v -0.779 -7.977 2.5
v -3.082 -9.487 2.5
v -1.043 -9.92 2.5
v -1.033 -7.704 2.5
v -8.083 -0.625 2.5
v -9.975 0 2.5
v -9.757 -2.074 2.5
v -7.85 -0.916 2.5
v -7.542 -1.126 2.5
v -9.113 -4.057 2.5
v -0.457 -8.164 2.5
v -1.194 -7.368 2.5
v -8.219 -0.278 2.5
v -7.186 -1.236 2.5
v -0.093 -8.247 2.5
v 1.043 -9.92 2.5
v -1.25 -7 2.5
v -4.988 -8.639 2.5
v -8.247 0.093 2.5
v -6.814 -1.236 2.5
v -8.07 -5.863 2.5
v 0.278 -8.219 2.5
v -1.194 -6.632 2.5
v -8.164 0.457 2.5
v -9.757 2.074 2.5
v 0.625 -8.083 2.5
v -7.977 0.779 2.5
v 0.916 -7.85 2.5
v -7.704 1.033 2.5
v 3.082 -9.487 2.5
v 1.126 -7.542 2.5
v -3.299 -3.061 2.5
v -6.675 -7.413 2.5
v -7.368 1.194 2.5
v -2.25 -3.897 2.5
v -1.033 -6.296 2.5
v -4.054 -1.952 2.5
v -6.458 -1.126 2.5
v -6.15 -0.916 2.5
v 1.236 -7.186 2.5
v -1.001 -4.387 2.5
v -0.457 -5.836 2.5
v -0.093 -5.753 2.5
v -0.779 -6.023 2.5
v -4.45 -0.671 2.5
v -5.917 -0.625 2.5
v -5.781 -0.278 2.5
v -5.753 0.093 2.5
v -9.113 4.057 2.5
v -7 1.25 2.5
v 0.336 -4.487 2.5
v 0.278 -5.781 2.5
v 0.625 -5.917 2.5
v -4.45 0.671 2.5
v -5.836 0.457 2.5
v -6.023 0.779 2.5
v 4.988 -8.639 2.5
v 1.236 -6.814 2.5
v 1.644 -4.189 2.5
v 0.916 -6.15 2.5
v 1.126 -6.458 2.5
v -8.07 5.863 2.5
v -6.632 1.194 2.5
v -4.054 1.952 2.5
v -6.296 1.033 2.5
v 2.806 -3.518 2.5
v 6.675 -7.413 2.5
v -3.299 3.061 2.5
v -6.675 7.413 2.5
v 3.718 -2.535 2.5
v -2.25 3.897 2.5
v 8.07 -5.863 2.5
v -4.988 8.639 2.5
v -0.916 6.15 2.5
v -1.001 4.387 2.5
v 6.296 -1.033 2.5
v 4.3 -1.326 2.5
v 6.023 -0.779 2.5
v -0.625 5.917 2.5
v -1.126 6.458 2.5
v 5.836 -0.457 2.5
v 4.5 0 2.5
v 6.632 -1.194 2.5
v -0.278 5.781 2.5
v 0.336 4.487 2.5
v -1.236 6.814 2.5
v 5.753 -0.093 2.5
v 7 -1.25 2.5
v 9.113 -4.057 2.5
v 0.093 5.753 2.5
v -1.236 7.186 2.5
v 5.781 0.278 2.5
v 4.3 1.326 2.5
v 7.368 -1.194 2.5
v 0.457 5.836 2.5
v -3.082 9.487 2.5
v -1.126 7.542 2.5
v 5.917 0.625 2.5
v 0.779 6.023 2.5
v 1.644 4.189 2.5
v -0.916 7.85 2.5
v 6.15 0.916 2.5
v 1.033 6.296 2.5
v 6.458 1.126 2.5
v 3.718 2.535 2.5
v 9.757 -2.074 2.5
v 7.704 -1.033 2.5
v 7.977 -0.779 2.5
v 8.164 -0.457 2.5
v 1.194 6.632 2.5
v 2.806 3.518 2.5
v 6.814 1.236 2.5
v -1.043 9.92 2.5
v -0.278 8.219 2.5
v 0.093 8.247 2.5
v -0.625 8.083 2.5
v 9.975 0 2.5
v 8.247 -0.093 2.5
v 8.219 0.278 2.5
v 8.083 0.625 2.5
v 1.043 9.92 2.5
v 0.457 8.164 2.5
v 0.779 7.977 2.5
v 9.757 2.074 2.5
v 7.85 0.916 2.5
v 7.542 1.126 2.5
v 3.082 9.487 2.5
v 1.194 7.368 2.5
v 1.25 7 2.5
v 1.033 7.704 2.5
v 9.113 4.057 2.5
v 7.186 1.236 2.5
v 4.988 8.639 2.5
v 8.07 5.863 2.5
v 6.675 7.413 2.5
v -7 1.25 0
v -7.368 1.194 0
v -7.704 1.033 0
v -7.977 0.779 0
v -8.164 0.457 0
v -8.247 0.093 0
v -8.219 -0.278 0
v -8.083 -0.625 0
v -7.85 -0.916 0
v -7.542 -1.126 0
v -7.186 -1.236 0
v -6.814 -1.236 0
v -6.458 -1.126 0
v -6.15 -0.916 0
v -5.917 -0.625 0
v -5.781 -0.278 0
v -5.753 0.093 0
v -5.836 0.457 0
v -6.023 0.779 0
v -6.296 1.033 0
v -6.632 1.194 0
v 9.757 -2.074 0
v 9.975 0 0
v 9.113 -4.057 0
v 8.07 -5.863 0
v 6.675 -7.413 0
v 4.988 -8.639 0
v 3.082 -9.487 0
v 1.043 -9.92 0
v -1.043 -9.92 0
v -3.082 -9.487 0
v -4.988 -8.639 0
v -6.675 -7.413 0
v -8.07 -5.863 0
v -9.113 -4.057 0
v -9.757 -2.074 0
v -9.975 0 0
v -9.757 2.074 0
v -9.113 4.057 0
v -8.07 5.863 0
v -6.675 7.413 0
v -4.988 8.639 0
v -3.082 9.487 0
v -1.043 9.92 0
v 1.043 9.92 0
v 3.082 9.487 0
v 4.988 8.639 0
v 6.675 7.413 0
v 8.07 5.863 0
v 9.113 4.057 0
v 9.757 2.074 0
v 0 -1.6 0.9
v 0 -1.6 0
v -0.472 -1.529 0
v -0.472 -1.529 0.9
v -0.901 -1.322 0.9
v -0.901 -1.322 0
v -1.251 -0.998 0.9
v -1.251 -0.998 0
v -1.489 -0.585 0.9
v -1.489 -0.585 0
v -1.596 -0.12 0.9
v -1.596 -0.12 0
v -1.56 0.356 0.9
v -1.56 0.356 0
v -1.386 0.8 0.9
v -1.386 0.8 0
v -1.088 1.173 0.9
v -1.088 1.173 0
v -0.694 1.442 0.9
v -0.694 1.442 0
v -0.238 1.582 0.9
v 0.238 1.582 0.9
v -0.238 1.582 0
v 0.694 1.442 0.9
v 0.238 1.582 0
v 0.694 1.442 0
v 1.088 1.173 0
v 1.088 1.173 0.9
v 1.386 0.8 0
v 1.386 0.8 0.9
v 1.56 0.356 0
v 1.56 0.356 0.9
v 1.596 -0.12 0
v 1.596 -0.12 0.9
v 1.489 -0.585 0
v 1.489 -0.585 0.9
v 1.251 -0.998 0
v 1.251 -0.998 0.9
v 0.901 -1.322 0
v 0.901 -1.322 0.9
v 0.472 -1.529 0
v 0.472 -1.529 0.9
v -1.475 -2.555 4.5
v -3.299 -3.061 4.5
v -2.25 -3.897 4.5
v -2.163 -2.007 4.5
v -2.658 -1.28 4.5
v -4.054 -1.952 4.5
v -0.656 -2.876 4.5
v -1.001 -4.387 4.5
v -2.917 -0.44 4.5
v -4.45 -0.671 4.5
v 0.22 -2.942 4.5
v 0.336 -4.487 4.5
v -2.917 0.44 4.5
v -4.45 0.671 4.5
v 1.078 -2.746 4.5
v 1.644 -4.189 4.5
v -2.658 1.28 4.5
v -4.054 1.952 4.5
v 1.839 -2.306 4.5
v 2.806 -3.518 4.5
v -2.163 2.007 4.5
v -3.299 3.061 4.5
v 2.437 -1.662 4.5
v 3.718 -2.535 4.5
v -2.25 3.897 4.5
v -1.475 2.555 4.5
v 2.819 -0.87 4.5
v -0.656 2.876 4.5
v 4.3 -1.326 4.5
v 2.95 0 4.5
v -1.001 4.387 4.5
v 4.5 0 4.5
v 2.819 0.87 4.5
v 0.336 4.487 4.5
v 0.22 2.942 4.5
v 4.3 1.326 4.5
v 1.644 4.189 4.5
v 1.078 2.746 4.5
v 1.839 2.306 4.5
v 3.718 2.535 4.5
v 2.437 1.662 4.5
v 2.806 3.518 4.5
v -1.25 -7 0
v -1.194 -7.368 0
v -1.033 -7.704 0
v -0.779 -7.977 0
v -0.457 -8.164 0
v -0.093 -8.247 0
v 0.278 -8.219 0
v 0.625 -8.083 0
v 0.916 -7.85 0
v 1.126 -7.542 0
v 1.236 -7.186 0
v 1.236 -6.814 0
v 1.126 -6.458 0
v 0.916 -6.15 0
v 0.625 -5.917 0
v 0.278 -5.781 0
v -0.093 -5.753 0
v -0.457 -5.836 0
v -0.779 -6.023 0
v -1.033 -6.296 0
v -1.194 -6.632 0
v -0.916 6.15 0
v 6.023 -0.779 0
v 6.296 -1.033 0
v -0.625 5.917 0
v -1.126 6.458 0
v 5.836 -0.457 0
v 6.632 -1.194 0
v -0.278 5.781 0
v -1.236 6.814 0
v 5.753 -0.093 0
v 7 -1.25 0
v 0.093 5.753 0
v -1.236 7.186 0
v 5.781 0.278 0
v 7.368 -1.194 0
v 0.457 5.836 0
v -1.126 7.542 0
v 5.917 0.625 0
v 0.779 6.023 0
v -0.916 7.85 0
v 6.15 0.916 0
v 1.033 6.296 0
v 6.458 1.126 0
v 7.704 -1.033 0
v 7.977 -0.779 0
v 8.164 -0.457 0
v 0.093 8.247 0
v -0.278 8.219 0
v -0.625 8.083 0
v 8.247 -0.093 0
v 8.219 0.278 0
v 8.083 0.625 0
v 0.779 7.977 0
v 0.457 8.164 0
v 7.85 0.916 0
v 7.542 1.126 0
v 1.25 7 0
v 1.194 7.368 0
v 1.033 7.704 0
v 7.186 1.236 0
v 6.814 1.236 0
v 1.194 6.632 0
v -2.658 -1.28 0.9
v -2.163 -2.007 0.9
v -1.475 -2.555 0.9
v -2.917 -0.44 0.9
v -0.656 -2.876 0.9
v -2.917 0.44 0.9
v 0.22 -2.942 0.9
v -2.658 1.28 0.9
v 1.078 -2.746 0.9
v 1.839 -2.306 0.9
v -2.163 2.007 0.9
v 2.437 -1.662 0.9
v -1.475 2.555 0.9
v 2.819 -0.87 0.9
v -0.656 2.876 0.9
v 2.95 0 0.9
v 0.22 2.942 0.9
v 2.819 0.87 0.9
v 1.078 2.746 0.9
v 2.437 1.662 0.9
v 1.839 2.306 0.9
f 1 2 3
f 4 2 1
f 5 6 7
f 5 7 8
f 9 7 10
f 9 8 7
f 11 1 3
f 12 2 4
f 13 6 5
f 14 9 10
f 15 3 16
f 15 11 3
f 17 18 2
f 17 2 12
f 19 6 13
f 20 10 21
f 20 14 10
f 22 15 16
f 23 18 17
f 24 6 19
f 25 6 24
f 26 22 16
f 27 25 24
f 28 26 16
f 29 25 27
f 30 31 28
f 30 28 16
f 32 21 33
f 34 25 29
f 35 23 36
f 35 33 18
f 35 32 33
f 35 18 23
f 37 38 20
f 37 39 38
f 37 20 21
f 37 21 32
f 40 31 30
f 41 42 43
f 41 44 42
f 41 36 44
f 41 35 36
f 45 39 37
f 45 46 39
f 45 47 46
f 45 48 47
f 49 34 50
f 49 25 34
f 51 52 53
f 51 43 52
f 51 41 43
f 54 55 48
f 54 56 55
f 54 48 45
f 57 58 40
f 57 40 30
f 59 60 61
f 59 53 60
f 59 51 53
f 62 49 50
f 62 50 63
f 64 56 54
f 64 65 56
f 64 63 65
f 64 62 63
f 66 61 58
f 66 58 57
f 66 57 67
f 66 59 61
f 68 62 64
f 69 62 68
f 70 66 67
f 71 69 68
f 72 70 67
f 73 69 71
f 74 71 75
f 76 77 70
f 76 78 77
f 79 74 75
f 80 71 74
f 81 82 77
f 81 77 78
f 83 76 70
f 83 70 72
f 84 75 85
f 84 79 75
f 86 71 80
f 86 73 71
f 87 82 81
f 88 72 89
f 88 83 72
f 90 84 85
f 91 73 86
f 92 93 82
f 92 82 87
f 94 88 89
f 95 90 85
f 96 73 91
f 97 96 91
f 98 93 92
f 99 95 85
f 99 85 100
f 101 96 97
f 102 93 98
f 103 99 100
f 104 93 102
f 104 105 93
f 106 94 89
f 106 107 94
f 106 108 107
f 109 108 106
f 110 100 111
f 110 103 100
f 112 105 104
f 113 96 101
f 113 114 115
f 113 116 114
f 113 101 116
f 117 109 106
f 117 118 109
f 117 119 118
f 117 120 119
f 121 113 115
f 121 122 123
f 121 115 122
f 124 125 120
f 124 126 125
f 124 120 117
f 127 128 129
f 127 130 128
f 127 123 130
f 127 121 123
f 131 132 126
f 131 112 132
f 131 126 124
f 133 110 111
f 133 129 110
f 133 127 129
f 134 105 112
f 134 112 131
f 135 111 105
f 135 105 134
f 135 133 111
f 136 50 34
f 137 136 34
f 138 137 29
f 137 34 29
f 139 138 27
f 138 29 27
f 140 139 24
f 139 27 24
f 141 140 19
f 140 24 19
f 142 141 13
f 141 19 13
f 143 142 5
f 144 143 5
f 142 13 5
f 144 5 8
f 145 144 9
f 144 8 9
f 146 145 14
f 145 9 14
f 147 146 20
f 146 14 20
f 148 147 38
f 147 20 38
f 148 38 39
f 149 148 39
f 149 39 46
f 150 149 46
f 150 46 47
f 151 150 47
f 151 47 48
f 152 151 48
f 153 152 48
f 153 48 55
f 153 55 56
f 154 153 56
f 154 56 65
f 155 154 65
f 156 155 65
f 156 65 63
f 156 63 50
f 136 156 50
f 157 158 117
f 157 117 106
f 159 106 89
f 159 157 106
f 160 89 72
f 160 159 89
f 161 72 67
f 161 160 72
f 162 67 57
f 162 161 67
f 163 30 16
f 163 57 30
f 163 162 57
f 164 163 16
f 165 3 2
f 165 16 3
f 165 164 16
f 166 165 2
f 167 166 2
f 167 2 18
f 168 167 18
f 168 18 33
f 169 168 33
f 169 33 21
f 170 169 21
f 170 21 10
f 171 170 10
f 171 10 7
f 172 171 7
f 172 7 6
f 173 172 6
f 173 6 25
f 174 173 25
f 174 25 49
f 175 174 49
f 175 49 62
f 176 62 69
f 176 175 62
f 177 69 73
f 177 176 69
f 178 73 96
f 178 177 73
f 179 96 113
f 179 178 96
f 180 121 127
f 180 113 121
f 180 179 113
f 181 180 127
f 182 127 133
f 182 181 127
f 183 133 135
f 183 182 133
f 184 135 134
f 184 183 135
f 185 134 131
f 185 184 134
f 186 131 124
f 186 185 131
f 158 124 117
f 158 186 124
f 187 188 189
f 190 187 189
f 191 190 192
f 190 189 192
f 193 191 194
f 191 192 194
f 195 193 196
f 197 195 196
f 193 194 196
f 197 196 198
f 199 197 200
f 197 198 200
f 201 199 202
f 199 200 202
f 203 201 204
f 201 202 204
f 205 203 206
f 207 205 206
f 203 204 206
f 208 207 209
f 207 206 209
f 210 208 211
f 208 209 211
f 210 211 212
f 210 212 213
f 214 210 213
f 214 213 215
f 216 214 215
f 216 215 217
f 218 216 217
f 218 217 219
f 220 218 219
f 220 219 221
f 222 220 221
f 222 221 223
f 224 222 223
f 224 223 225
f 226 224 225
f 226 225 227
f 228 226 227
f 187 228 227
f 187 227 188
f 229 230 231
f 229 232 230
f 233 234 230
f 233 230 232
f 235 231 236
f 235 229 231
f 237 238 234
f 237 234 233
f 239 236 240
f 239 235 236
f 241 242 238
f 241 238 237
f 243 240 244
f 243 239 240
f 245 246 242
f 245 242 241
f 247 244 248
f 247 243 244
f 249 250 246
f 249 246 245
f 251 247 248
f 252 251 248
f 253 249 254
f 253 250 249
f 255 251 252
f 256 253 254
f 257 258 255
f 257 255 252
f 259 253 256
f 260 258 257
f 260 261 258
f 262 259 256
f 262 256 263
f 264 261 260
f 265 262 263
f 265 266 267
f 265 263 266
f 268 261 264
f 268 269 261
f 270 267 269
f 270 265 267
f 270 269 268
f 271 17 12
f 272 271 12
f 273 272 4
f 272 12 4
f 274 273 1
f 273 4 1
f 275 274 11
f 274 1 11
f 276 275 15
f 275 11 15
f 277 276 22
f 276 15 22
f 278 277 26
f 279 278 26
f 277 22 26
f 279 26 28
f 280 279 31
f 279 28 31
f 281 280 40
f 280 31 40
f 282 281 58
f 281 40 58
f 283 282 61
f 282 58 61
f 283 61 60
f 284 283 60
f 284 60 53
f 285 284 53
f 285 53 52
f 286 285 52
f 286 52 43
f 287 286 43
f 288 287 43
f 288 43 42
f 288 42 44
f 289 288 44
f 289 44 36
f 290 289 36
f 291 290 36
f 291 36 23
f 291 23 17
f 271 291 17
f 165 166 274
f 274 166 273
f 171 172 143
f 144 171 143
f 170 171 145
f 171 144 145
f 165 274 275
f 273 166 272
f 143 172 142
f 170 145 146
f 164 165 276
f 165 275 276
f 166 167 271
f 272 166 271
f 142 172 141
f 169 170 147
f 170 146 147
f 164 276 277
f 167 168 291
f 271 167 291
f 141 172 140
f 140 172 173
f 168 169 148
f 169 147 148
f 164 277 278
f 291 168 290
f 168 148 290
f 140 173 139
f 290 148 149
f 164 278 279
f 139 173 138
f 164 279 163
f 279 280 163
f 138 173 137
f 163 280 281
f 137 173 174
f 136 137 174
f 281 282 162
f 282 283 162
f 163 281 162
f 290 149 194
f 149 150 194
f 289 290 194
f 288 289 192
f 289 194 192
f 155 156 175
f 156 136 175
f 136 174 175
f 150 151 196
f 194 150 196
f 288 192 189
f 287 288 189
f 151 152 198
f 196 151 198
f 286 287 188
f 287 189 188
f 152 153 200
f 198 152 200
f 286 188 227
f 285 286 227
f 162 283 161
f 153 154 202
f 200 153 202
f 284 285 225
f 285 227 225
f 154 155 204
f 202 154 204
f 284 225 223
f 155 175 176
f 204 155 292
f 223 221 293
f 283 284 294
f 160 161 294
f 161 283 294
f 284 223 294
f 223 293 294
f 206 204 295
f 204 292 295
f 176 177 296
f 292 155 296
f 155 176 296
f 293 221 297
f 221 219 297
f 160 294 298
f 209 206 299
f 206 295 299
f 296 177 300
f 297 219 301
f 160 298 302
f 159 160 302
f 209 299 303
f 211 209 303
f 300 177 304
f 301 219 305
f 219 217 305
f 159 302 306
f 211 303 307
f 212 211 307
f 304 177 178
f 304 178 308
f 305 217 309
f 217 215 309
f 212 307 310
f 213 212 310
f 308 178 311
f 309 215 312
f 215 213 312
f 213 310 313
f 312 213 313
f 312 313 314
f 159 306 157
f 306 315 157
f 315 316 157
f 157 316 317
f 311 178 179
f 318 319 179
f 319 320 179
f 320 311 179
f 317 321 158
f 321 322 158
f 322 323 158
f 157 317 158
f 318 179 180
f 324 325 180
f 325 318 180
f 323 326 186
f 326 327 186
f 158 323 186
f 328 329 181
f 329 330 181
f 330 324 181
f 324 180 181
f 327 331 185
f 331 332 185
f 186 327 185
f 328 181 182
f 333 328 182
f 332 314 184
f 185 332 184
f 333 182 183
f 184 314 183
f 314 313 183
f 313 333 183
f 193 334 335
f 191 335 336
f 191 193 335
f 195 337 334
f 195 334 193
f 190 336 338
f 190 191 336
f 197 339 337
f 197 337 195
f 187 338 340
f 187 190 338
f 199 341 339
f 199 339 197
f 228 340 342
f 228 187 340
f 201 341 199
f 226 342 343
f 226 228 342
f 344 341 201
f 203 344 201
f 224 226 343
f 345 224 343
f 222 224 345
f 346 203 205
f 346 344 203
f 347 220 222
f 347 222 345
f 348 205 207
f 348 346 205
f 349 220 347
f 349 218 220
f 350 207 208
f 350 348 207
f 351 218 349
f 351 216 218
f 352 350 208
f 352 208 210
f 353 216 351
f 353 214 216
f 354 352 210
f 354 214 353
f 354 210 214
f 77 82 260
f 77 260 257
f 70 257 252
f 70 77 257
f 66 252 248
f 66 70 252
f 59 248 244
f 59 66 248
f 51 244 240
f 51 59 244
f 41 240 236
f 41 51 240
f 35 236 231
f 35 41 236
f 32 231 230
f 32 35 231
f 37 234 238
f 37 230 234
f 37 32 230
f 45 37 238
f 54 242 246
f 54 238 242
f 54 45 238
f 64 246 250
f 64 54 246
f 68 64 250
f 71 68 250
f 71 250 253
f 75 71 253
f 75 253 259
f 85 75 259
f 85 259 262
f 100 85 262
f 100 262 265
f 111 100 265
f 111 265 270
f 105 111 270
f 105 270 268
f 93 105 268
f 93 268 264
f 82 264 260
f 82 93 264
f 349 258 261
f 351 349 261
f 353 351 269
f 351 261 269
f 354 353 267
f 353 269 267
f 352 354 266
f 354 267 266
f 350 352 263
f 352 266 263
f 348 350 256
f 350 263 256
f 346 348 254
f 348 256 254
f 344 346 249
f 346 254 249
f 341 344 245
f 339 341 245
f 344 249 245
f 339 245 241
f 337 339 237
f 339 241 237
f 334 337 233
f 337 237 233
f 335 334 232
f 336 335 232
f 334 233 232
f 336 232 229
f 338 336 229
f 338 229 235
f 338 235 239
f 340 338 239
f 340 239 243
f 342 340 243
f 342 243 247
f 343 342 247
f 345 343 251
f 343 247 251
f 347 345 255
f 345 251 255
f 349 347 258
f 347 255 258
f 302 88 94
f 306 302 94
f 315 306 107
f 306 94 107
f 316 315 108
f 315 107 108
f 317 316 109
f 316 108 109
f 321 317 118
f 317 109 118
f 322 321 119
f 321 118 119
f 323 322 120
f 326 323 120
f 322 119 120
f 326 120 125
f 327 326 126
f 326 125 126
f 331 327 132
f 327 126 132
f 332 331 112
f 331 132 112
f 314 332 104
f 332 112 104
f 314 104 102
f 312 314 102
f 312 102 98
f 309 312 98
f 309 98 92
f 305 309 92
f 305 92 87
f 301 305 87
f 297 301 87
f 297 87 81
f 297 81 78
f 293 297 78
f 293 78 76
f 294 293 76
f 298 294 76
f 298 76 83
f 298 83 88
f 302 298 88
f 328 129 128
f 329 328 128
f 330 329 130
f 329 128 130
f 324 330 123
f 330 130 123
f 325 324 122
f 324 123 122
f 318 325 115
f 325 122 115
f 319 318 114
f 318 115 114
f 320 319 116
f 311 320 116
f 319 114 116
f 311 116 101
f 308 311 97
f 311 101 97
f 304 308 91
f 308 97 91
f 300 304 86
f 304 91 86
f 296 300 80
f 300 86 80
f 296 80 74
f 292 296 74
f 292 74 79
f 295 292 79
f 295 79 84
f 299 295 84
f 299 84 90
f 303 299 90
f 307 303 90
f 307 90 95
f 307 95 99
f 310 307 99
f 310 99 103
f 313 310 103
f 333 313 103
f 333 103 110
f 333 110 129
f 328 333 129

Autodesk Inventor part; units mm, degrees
ref_plane "YZ Plane" through (0, 0, 0) normal (1, 0, 0) x (0, 1, 0)
ref_plane "XZ Plane" through (0, 0, 0) normal (0, 1, 0) x (-1, 0, 0)
ref_plane "XY Plane" through (0, 0, 0) normal (0, 0, 1) x (1, 0, 0)
sketch "スケッチ1" plane through (0, 0, 0) normal (0, 0, 1) x (1, 0, 0)
  circle A0 centre (0, 0) radius 9.975
  dimension "d0" = 19.95
extrude "押し出し1" add sketch "スケッチ1" along normal blind 2.5
sketch "スケッチ2" plane through (0, 0, 2.5) normal (0, 0, 1) x (1, 0, 0)
  circle A0 centre (0, 0) radius 4.5
  dimension "d3" = 9
extrude "押し出し2" add sketch "スケッチ2" along normal blind 2
sketch "スケッチ3" plane through (0, 0, 4.5) normal (0, 0, 1) x (1, 0, 0)
  point P0 (0, 0)
  point P1 (0, 0)
hole "穴1" at (0, 0, 4.5) direction (0, 0, -1) diameter 3.2 end through all
sketch "スケッチ4" plane through (0, 0, 0) normal (0, 0, -1) x (-1, 0, 0)
  circle A0 centre (0, 0) radius 1.6 construction
  circle A1 centre (0, 0) radius 7 construction
  point P0 (7, 0)
  dimension "d13" = 14
hole "穴2" at (-7, 0, 0) direction (0, 0, 1) diameter 2.5 end through all
thread "ねじ1" size "M3x0.5" class "6H" standard "ISO Metric profile" full length
pattern_circular "円形状パターン1" count 4 over 360 about axis through (0, 0, -10) along (0, 0, 1) of "穴2"
sketch "スケッチ5" plane through (0, 0, 4.5) normal (0, 0, 1) x (1, 0, 0)
  circle A0 centre (0, 0) radius 2.95
  dimension "d26" = 5.9
extrude "押し出し3" cut sketch "スケッチ5" against normal blind 3.6
properties part number "feetech_servo-hone"
